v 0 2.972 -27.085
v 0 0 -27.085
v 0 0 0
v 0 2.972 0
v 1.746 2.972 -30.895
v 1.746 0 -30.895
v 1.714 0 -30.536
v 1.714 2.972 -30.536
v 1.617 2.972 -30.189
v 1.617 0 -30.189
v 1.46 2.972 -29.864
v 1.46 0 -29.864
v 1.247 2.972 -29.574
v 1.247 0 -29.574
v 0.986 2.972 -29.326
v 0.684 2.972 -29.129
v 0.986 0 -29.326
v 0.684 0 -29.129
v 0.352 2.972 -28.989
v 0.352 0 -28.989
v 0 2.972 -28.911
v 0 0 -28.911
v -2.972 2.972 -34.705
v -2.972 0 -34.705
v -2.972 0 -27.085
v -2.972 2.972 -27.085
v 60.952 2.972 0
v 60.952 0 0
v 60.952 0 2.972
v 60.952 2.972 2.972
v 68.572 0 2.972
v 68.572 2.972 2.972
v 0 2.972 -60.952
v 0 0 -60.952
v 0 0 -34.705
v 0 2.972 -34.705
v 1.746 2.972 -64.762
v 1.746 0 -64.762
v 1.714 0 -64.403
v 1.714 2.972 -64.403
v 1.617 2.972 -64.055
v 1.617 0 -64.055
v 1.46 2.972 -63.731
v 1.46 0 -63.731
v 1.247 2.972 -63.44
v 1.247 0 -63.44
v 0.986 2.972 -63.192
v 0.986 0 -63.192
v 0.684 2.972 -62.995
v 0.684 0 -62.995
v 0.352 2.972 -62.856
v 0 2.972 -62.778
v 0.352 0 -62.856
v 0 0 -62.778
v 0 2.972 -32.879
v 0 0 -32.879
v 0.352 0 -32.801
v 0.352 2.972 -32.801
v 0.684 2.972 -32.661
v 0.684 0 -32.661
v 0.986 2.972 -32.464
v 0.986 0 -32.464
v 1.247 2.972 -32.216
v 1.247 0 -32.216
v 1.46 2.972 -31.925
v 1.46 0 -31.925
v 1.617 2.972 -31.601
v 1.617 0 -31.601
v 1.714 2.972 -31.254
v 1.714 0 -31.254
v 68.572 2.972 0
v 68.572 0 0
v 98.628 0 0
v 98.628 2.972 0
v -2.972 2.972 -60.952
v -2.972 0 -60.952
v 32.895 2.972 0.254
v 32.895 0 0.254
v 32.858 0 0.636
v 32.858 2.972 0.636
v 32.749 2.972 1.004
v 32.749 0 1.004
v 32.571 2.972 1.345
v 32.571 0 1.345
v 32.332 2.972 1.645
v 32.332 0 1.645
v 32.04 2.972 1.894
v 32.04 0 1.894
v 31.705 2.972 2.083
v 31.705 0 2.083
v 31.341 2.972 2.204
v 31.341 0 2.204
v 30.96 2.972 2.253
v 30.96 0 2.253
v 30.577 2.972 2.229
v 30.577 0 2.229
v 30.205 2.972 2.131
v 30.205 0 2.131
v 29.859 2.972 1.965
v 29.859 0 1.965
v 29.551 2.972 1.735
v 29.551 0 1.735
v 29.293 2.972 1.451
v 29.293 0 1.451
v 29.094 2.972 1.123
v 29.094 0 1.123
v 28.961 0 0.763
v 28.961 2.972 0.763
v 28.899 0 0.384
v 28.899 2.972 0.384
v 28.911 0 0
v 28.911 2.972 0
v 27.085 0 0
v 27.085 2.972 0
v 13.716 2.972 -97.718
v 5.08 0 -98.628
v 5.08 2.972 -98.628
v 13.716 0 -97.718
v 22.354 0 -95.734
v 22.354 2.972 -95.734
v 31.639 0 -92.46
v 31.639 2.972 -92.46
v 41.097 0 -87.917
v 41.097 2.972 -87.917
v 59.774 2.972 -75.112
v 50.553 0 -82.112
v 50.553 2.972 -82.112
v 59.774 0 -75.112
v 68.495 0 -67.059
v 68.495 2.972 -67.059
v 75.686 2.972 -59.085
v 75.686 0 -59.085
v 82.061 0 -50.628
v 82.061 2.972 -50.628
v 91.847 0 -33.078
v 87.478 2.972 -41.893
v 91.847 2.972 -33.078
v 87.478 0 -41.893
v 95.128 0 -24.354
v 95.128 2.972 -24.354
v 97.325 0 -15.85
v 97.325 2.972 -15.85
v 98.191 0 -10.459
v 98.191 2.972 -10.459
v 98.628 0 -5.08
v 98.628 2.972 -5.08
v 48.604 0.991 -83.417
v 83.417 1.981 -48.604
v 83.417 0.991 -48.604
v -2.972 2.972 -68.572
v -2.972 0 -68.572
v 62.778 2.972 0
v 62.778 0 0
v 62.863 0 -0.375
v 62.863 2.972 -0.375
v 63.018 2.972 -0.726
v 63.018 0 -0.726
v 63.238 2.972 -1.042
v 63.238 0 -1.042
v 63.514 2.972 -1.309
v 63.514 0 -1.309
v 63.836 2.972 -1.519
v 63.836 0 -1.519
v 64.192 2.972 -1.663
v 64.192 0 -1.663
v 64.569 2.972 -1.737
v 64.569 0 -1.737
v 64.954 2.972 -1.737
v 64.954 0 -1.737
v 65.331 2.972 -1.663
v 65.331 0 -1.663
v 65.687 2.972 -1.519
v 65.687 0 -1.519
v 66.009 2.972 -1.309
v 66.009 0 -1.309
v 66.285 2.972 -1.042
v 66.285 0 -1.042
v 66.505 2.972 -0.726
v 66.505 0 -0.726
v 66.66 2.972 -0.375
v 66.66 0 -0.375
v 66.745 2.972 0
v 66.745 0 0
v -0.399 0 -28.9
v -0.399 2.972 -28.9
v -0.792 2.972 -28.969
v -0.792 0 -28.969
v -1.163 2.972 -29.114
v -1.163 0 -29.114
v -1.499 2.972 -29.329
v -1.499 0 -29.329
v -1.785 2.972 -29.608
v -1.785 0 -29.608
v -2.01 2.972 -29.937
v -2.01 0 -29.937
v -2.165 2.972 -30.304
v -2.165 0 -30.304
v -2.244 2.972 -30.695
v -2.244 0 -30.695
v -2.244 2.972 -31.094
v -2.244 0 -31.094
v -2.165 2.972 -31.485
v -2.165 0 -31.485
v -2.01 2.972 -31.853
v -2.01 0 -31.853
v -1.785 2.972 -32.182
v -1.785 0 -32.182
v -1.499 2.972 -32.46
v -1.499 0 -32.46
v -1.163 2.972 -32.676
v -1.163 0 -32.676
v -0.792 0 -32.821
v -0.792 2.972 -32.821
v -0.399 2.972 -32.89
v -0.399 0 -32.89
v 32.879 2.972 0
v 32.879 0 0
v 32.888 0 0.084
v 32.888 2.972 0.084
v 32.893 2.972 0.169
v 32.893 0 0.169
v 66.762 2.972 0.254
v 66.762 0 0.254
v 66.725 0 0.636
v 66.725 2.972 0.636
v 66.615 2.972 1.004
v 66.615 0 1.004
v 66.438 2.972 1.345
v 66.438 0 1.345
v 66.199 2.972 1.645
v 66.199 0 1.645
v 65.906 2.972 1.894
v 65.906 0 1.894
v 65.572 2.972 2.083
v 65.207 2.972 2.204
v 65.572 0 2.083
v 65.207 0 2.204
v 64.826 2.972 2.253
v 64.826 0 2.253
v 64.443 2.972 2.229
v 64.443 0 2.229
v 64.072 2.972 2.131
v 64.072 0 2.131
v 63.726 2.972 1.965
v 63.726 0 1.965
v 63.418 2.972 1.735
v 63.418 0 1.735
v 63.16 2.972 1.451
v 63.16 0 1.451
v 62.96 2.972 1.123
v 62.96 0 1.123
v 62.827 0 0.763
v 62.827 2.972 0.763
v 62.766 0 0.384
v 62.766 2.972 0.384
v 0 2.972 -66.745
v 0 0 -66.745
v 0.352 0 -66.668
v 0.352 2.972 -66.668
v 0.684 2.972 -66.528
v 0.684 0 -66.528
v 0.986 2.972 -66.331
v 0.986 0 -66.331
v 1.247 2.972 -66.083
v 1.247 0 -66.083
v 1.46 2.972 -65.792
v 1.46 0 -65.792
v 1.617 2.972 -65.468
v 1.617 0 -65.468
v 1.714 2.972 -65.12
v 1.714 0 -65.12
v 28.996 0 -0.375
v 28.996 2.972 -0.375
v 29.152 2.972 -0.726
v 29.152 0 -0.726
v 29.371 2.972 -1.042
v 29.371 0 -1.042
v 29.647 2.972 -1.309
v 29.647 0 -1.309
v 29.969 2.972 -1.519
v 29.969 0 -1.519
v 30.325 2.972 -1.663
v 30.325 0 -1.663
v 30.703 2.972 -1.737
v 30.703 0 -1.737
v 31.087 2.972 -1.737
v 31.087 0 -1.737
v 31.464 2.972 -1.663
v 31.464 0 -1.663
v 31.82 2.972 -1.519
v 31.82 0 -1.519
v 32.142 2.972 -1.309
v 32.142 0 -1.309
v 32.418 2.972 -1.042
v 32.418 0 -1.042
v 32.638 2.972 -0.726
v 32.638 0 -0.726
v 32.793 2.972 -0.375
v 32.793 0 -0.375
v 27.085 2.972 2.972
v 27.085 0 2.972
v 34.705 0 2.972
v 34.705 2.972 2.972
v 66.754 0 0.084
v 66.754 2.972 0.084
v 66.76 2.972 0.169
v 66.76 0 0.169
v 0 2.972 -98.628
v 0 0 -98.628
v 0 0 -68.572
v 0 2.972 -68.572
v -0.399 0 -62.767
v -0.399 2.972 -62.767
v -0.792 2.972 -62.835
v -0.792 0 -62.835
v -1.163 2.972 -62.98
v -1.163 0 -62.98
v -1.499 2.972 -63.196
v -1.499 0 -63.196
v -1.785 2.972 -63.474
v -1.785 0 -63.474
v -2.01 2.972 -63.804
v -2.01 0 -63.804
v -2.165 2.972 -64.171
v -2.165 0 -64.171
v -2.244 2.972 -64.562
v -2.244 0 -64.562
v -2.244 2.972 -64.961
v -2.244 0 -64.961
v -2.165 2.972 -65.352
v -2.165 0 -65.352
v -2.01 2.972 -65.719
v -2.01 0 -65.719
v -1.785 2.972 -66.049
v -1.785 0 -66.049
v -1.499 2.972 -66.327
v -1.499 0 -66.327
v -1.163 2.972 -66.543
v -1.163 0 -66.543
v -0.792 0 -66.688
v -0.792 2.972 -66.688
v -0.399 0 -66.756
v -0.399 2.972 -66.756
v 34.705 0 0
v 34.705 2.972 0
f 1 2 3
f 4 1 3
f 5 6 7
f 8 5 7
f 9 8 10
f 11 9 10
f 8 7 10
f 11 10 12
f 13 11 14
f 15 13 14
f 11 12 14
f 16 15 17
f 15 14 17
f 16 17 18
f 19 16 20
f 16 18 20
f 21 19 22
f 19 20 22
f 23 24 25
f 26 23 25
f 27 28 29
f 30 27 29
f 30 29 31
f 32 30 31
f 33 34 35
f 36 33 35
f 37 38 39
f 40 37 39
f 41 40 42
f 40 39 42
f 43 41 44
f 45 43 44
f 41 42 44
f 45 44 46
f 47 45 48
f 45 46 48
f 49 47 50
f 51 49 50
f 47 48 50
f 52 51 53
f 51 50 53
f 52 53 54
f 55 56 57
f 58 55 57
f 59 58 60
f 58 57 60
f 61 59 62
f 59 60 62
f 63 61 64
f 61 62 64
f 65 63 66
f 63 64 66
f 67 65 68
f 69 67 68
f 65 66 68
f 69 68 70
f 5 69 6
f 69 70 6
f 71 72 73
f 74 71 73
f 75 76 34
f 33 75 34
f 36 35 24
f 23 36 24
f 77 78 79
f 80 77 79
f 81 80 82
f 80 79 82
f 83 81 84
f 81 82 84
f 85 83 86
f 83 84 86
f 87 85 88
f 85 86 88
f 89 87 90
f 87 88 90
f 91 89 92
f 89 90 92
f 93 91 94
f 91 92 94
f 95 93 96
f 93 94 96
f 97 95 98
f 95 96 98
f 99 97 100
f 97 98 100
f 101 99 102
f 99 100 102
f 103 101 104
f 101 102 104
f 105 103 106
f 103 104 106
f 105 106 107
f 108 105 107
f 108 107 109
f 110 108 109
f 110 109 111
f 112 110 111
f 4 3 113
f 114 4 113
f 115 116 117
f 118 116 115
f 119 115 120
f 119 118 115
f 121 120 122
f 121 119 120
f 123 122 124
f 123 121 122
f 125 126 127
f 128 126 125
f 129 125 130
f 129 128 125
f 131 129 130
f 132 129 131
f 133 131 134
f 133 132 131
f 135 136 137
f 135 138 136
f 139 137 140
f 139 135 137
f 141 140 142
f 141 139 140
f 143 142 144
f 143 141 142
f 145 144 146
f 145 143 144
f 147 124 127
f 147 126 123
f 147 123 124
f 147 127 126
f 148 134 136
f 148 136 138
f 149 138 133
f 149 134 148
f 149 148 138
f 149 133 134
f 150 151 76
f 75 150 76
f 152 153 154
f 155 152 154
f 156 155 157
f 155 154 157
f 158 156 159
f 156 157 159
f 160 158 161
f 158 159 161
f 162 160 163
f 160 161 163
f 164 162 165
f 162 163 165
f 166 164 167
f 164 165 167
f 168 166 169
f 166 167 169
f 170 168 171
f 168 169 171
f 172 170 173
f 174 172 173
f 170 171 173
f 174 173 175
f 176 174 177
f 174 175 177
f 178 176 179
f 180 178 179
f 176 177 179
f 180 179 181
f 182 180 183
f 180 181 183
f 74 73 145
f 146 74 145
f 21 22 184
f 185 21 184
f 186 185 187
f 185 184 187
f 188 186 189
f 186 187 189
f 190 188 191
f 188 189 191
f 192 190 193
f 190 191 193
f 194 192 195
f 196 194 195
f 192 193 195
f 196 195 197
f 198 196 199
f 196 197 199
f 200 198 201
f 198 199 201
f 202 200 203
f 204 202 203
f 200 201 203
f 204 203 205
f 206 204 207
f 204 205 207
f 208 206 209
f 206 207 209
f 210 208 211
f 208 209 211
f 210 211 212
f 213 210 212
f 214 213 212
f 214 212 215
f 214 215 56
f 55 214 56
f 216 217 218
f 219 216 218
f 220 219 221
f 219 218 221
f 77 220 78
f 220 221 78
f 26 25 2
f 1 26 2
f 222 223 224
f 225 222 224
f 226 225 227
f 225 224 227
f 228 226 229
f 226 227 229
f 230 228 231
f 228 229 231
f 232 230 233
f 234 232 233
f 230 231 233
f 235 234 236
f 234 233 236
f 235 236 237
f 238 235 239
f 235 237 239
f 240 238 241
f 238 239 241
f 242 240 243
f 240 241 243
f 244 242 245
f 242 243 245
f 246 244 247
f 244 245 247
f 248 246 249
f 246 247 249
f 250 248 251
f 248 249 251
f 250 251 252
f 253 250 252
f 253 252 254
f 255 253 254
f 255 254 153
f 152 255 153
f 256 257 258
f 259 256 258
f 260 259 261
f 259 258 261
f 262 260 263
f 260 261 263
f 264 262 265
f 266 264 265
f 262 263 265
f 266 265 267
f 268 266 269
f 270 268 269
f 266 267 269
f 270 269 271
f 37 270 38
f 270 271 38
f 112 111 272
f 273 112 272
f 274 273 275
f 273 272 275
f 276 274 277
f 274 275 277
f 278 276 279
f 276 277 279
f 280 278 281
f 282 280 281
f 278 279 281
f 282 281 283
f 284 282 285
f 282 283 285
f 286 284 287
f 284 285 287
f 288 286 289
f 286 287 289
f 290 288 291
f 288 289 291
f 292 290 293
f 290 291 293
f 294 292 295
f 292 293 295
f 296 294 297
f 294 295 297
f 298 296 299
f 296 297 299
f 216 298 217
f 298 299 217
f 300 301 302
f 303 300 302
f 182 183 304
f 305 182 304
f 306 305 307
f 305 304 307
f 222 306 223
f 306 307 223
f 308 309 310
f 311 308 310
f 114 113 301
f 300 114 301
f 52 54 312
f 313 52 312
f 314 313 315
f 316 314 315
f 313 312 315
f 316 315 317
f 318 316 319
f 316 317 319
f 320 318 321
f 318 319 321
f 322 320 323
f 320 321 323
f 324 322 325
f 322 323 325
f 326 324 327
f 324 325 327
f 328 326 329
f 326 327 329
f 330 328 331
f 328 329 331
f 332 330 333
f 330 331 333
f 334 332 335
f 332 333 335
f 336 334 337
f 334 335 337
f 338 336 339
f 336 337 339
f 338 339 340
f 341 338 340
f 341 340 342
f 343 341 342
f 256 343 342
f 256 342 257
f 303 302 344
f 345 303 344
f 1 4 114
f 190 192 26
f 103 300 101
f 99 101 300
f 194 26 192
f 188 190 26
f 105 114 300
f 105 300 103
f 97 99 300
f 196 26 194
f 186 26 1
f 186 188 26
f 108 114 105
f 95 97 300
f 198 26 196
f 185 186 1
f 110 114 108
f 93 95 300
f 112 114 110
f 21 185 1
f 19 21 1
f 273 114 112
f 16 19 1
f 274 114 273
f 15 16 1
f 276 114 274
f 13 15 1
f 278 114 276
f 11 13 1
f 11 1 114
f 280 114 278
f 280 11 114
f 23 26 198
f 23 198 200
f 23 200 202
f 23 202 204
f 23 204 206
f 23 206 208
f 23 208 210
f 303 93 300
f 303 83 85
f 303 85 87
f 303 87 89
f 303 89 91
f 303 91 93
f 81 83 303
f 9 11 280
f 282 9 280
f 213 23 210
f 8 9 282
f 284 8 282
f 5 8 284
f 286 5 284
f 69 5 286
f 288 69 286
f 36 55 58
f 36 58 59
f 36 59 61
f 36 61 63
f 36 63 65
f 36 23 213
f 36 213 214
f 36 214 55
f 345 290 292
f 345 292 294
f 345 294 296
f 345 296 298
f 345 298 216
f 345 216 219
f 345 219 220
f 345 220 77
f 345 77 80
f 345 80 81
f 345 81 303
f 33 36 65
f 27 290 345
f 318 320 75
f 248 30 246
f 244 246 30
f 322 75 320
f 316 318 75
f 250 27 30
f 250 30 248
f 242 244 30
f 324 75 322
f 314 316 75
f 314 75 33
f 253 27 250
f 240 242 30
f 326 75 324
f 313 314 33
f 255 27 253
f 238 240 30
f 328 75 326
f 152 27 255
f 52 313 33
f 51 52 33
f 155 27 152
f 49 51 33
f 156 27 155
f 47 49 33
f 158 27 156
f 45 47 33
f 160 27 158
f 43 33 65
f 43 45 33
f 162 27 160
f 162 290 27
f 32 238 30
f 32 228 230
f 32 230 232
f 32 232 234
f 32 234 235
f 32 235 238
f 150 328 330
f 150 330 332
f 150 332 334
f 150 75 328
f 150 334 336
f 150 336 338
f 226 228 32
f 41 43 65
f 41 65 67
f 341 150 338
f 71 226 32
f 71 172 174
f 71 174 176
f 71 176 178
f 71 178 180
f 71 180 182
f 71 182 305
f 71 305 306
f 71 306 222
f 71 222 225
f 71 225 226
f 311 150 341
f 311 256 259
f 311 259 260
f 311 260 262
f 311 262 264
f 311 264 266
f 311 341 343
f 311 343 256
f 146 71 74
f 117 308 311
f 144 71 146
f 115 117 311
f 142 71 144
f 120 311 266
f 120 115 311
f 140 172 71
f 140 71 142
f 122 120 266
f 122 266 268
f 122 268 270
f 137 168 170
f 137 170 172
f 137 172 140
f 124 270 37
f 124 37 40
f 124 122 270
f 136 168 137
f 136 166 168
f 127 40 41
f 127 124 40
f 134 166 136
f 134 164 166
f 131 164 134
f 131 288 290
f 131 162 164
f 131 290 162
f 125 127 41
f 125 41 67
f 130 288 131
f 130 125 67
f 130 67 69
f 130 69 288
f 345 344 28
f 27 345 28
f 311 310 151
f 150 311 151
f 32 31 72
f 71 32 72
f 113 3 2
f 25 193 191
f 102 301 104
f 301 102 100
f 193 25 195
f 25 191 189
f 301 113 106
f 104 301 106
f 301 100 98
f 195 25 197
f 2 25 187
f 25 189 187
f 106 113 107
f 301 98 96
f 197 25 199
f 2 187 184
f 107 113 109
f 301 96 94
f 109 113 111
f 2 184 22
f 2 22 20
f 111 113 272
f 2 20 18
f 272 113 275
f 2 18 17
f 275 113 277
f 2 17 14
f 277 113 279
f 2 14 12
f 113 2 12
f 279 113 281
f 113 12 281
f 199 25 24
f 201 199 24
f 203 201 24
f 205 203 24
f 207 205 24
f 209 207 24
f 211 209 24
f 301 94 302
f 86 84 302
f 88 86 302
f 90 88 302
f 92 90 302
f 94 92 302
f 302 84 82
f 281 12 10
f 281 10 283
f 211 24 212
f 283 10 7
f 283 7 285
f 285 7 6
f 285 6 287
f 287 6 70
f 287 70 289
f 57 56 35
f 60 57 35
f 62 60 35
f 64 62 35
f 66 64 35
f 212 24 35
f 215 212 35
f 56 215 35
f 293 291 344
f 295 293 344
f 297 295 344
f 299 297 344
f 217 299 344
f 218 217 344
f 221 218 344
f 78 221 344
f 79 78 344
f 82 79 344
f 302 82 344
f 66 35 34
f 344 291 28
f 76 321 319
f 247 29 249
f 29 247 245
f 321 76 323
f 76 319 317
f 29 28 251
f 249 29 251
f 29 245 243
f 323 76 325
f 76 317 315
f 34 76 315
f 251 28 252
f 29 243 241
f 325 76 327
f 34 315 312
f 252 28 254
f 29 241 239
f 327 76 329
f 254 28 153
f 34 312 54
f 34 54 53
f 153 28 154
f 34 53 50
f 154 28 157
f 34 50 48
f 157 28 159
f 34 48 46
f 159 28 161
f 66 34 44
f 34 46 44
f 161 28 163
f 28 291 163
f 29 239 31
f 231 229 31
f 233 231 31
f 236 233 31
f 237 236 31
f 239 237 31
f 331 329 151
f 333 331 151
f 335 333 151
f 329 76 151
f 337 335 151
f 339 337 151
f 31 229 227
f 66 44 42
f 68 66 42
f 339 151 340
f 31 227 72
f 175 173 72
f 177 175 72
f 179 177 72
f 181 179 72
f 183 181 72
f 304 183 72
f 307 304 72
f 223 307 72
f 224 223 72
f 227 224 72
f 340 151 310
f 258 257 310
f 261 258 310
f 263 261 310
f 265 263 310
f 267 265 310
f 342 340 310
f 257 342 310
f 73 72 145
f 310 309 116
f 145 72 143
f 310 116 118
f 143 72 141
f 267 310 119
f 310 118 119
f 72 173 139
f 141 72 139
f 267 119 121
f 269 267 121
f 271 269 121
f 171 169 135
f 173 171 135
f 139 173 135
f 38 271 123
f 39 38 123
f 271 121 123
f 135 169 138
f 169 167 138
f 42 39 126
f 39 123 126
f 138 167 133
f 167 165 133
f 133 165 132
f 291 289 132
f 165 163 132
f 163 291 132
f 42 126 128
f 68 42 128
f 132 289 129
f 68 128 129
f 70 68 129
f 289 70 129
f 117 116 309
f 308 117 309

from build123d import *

# Parameters (mm, degrees)
EXTRUDE_1_DEPTH = 2.9718


with BuildPart() as part:
    # 草图1 → 凸台-拉伸1 (new body)
    with BuildSketch(Plane(origin=(0, 0, 0), x_dir=(1, 0, 0), z_dir=(0, 1, 0))):
        with BuildLine():
            Line((0, 60.951533333), (0, 34.704866667))
            Line((0, 34.704866667), (0, 32.878672101))
            ThreePointArc((0, 32.878672101), (1.247332741, 32.216229599), (1.746, 30.894866667))
            ThreePointArc((1.746, 30.894866667), (1.247332741, 29.573503734), (0, 28.911061233))
            Line((0, 28.911061233), (0, 27.084866667))
            Line((0, 27.084866667), (0, 0))
            Line((0, 0), (27.084866667, 0))
            Line((27.084866667, 0), (28.911061233, 0))
            ThreePointArc((28.911061233, 0), (30.894866667, 1.746), (32.878672101, 0))
            Line((32.878672101, 0), (34.704866667, 0))
            Line((34.704866667, 0), (60.951533333, 0))
            Line((60.951533333, 0), (62.777727899, 0))
            ThreePointArc((62.777727899, 0), (64.761533333, 1.746), (66.745338767, 0))
            Line((66.745338767, 0), (68.571533333, 0))
            Line((68.571533333, 0), (98.6282, 0))
            Line((98.6282, 0), (98.6282, 5.08))
            add(Edge.make_bspline(
                [(5.08, 98.6282), (49.328709516, 96.847818465), (96.847818465, 49.328709516), (98.6282, 5.08)],
                knots=[0.03565985, 0.03565985, 0.03565985, 0.03565985, 0.96434015, 0.96434015, 0.96434015, 0.96434015], degree=3))
            Line((5.08, 98.6282), (0, 98.6282))
            Line((0, 98.6282), (0, 68.571533333))
            Line((0, 68.571533333), (0, 66.745338767))
            ThreePointArc((0, 66.745338767), (1.247332741, 66.082896266), (1.746, 64.761533333))
            ThreePointArc((1.746, 64.761533333), (1.247332741, 63.440170401), (0, 62.777727899))
            Line((0, 62.777727899), (0, 60.951533333))
        make_face()
        with BuildLine():
            Line((-2.9718, 60.951533333), (0, 60.951533333))
            Line((0, 60.951533333), (0, 62.777727899))
            ThreePointArc((0, 62.777727899), (-2.254, 64.761533333), (0, 66.745338767))
            Line((0, 66.745338767), (0, 68.571533333))
            Line((0, 68.571533333), (-2.9718, 68.571533333))
            Line((-2.9718, 68.571533333), (-2.9718, 60.951533333))
        make_face()
        with BuildLine():
            Line((0, 32.878672101), (0, 34.704866667))
            Line((0, 34.704866667), (-2.9718, 34.704866667))
            Line((-2.9718, 34.704866667), (-2.9718, 27.084866667))
            Line((-2.9718, 27.084866667), (0, 27.084866667))
            Line((0, 27.084866667), (0, 28.911061233))
            ThreePointArc((0, 28.911061233), (-2.254, 30.894866667), (0, 32.878672101))
        make_face()
        with BuildLine():
            Line((28.911061233, 0), (27.084866667, 0))
            Line((27.084866667, 0), (27.084866667, -2.9718))
            Line((27.084866667, -2.9718), (34.704866667, -2.9718))
            Line((34.704866667, -2.9718), (34.704866667, 0))
            Line((34.704866667, 0), (32.878672101, 0))
            ThreePointArc((32.878672101, 0), (32.890813919, -0.126742128), (32.894866667, -0.254))
            ThreePointArc((32.894866667, -0.254), (30.767608795, -2.249947252), (28.911061233, 0))
        make_face()
        with BuildLine():
            Line((62.777727899, 0), (60.951533333, 0))
            Line((60.951533333, 0), (60.951533333, -2.9718))
            Line((60.951533333, -2.9718), (68.571533333, -2.9718))
            Line((68.571533333, -2.9718), (68.571533333, 0))
            Line((68.571533333, 0), (66.745338767, 0))
            ThreePointArc((66.745338767, 0), (66.757480586, -0.126742128), (66.761533333, -0.254))
            ThreePointArc((66.761533333, -0.254), (64.634275461, -2.249947252), (62.777727899, 0))
        make_face()
    extrude(amount=EXTRUDE_1_DEPTH)


solid = part.part
